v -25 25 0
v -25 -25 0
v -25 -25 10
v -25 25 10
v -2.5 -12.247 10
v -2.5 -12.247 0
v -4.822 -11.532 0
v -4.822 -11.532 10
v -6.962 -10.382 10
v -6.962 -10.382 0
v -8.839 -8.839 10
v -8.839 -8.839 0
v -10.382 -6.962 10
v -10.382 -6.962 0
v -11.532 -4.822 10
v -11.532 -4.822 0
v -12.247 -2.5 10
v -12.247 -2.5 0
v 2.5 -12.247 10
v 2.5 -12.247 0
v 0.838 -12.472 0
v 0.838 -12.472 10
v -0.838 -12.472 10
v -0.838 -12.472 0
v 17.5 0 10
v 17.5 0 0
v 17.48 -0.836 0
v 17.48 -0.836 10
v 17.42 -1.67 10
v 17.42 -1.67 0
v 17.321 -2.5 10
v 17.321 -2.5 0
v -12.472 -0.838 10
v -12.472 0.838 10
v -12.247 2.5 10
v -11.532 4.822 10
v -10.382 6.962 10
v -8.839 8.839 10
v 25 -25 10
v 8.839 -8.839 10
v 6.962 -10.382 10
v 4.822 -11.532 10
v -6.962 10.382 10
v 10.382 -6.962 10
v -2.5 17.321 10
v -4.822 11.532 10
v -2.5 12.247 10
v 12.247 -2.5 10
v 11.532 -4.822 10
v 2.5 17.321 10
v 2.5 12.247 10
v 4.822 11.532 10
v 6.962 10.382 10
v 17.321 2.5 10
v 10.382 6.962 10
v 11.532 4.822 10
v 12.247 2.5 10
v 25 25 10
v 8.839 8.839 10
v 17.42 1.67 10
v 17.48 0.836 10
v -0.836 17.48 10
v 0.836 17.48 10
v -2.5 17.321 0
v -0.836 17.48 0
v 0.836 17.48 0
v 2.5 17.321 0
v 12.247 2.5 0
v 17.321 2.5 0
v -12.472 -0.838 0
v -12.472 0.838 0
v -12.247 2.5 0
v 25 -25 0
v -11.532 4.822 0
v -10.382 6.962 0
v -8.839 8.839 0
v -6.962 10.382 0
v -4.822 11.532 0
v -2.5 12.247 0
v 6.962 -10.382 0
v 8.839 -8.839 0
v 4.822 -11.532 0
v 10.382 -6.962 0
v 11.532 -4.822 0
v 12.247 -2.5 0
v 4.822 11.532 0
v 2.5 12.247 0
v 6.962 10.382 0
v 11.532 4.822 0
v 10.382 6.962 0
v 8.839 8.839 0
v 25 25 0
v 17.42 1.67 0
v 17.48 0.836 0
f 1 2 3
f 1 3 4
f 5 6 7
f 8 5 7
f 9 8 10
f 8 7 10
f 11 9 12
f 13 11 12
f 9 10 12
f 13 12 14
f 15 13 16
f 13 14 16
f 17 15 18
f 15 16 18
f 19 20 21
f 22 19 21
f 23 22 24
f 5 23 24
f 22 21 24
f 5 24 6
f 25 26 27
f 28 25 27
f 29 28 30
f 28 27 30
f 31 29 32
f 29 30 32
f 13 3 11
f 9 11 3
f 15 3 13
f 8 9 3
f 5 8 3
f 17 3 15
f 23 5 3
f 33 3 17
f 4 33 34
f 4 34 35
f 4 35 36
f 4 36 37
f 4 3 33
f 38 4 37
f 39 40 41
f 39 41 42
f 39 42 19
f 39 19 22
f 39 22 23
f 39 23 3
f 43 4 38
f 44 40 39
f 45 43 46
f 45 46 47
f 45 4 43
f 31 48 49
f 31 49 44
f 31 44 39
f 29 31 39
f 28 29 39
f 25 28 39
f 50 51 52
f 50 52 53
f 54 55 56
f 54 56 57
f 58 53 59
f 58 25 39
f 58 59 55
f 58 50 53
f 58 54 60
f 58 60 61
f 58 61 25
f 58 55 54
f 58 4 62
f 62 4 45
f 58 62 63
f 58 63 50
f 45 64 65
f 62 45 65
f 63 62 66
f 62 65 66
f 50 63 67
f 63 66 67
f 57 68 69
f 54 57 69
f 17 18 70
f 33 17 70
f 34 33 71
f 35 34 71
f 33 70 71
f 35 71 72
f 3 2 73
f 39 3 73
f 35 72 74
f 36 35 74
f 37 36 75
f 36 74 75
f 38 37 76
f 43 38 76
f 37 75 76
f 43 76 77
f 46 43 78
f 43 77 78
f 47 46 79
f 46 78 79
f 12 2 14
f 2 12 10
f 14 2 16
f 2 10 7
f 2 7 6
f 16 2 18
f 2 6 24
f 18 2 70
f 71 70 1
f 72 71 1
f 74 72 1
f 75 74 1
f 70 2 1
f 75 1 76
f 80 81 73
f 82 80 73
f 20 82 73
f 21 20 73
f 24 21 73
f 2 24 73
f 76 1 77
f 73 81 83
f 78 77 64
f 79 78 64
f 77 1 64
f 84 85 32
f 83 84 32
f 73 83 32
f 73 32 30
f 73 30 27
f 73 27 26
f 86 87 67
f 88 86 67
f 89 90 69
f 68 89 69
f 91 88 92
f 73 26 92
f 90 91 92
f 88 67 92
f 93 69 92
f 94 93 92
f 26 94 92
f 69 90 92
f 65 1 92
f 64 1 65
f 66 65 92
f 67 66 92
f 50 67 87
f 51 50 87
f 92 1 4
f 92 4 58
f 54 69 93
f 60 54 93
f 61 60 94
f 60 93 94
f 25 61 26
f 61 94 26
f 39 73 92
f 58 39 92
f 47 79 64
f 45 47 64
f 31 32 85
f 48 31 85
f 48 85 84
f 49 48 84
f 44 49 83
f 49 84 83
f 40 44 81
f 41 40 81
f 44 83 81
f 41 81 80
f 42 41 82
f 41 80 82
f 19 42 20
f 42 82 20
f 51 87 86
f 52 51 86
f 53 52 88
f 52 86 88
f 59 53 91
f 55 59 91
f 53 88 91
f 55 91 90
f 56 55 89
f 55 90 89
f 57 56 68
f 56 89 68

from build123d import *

# Parameters (mm, degrees)
F0_W     = 50
F0_H     = 50
F1_DEPTH = 10


with BuildPart() as f1:
    # F0 (on Top) → F1 (new body)
    with BuildSketch(Plane.XY):
        Rectangle(F0_W, F0_H)
        with BuildLine():
            ThreePointArc((2.5, 17.3205080757), (12.3743686708, 12.3743686708), (17.3205080757, 2.5))
            Line((17.3205080757, 2.5), (21.1176965386, 2.5))
            Line((21.1176965386, 2.5), (21.1176965386, -2.5))
            Line((21.1176965386, -2.5), (17.3205080757, -2.5))
            ThreePointArc((17.3205080757, -2.5), (12.3743686708, -12.3743686708), (2.5, -17.3205080757))
            Line((2.5, -17.3205080757), (2.5, -18.6099875718))
            Line((2.5, -18.6099875718), (-2.5, -18.6099875718))
            Line((-2.5, -18.6099875718), (-2.5, -17.3205080757))
            ThreePointArc((-2.5, -17.3205080757), (-12.3743686708, -12.3743686708), (-17.3205080757, -2.5))
            Line((-17.3205080757, -2.5), (-21.1176965386, -2.5))
            Line((-21.1176965386, -2.5), (-21.1176965386, 2.5))
            Line((-21.1176965386, 2.5), (-17.3205080757, 2.5))
            ThreePointArc((-17.3205080757, 2.5), (-12.3743686708, 12.3743686708), (-2.5, 17.3205080757))
            Line((-2.5, 17.3205080757), (-2.5, 18.6099875718))
            Line((-2.5, 18.6099875718), (2.5, 18.6099875718))
            Line((2.5, 18.6099875718), (2.5, 17.3205080757))
        make_face(mode=Mode.SUBTRACT)
        with BuildLine():
            ThreePointArc((-2.5, 17.3205080757), (0, 17.5), (2.5, 17.3205080757))
            Line((2.5, 17.3205080757), (2.5, 18.6099875718))
            Line((2.5, 18.6099875718), (-2.5, 18.6099875718))
            Line((-2.5, 18.6099875718), (-2.5, 17.3205080757))
        make_face()
        with BuildLine():
            ThreePointArc((-17.3205080757, -2.5), (-17.5, 0), (-17.3205080757, 2.5))
            Line((-17.3205080757, 2.5), (-21.1176965386, 2.5))
            Line((-21.1176965386, 2.5), (-21.1176965386, -2.5))
            Line((-21.1176965386, -2.5), (-17.3205080757, -2.5))
        make_face()
        with BuildLine():
            Line((2.5, -18.6099875718), (2.5, -17.3205080757))
            ThreePointArc((2.5, -17.3205080757), (0, -17.5), (-2.5, -17.3205080757))
            Line((-2.5, -17.3205080757), (-2.5, -18.6099875718))
            Line((-2.5, -18.6099875718), (2.5, -18.6099875718))
        make_face()
        with BuildLine():
            Line((21.1176965386, 2.5), (17.3205080757, 2.5))
            ThreePointArc((17.3205080757, 2.5), (17.4550693399, 1.2532175939), (17.5, 0))
            ThreePointArc((17.5, 0), (17.4550693399, -1.2532175939), (17.3205080757, -2.5))
            Line((17.3205080757, -2.5), (21.1176965386, -2.5))
            Line((21.1176965386, -2.5), (21.1176965386, 2.5))
        make_face()
        with BuildLine():
            ThreePointArc((2.5, 12.2474487139), (8.8388347648, 8.8388347648), (12.2474487139, 2.5))
            Line((12.2474487139, 2.5), (17.3205080757, 2.5))
            ThreePointArc((17.3205080757, 2.5), (12.3743686708, 12.3743686708), (2.5, 17.3205080757))
            Line((2.5, 17.3205080757), (2.5, 12.2474487139))
        make_face()
        with BuildLine():
            Line((17.3205080757, -2.5), (12.2474487139, -2.5))
            ThreePointArc((12.2474487139, -2.5), (8.8388347648, -8.8388347648), (2.5, -12.2474487139))
            Line((2.5, -12.2474487139), (2.5, -17.3205080757))
            ThreePointArc((2.5, -17.3205080757), (12.3743686708, -12.3743686708), (17.3205080757, -2.5))
        make_face()
        with BuildLine():
            Line((2.5, -17.3205080757), (2.5, -12.2474487139))
            ThreePointArc((2.5, -12.2474487139), (0, -12.5), (-2.5, -12.2474487139))
            Line((-2.5, -12.2474487139), (-2.5, -17.3205080757))
            ThreePointArc((-2.5, -17.3205080757), (0, -17.5), (2.5, -17.3205080757))
        make_face()
        with BuildLine():
            Line((-2.5, -17.3205080757), (-2.5, -12.2474487139))
            ThreePointArc((-2.5, -12.2474487139), (-8.8388347648, -8.8388347648), (-12.2474487139, -2.5))
            Line((-12.2474487139, -2.5), (-17.3205080757, -2.5))
            ThreePointArc((-17.3205080757, -2.5), (-12.3743686708, -12.3743686708), (-2.5, -17.3205080757))
        make_face()
        with BuildLine():
            ThreePointArc((-12.2474487139, -2.5), (-12.5, 0), (-12.2474487139, 2.5))
            Line((-12.2474487139, 2.5), (-17.3205080757, 2.5))
            ThreePointArc((-17.3205080757, 2.5), (-17.5, 0), (-17.3205080757, -2.5))
            Line((-17.3205080757, -2.5), (-12.2474487139, -2.5))
        make_face()
        with BuildLine():
            ThreePointArc((-12.2474487139, 2.5), (-8.8388347648, 8.8388347648), (-2.5, 12.2474487139))
            Line((-2.5, 12.2474487139), (-2.5, 17.3205080757))
            ThreePointArc((-2.5, 17.3205080757), (-12.3743686708, 12.3743686708), (-17.3205080757, 2.5))
            Line((-17.3205080757, 2.5), (-12.2474487139, 2.5))
        make_face()
    extrude(amount=F1_DEPTH)


solid = f1.part
